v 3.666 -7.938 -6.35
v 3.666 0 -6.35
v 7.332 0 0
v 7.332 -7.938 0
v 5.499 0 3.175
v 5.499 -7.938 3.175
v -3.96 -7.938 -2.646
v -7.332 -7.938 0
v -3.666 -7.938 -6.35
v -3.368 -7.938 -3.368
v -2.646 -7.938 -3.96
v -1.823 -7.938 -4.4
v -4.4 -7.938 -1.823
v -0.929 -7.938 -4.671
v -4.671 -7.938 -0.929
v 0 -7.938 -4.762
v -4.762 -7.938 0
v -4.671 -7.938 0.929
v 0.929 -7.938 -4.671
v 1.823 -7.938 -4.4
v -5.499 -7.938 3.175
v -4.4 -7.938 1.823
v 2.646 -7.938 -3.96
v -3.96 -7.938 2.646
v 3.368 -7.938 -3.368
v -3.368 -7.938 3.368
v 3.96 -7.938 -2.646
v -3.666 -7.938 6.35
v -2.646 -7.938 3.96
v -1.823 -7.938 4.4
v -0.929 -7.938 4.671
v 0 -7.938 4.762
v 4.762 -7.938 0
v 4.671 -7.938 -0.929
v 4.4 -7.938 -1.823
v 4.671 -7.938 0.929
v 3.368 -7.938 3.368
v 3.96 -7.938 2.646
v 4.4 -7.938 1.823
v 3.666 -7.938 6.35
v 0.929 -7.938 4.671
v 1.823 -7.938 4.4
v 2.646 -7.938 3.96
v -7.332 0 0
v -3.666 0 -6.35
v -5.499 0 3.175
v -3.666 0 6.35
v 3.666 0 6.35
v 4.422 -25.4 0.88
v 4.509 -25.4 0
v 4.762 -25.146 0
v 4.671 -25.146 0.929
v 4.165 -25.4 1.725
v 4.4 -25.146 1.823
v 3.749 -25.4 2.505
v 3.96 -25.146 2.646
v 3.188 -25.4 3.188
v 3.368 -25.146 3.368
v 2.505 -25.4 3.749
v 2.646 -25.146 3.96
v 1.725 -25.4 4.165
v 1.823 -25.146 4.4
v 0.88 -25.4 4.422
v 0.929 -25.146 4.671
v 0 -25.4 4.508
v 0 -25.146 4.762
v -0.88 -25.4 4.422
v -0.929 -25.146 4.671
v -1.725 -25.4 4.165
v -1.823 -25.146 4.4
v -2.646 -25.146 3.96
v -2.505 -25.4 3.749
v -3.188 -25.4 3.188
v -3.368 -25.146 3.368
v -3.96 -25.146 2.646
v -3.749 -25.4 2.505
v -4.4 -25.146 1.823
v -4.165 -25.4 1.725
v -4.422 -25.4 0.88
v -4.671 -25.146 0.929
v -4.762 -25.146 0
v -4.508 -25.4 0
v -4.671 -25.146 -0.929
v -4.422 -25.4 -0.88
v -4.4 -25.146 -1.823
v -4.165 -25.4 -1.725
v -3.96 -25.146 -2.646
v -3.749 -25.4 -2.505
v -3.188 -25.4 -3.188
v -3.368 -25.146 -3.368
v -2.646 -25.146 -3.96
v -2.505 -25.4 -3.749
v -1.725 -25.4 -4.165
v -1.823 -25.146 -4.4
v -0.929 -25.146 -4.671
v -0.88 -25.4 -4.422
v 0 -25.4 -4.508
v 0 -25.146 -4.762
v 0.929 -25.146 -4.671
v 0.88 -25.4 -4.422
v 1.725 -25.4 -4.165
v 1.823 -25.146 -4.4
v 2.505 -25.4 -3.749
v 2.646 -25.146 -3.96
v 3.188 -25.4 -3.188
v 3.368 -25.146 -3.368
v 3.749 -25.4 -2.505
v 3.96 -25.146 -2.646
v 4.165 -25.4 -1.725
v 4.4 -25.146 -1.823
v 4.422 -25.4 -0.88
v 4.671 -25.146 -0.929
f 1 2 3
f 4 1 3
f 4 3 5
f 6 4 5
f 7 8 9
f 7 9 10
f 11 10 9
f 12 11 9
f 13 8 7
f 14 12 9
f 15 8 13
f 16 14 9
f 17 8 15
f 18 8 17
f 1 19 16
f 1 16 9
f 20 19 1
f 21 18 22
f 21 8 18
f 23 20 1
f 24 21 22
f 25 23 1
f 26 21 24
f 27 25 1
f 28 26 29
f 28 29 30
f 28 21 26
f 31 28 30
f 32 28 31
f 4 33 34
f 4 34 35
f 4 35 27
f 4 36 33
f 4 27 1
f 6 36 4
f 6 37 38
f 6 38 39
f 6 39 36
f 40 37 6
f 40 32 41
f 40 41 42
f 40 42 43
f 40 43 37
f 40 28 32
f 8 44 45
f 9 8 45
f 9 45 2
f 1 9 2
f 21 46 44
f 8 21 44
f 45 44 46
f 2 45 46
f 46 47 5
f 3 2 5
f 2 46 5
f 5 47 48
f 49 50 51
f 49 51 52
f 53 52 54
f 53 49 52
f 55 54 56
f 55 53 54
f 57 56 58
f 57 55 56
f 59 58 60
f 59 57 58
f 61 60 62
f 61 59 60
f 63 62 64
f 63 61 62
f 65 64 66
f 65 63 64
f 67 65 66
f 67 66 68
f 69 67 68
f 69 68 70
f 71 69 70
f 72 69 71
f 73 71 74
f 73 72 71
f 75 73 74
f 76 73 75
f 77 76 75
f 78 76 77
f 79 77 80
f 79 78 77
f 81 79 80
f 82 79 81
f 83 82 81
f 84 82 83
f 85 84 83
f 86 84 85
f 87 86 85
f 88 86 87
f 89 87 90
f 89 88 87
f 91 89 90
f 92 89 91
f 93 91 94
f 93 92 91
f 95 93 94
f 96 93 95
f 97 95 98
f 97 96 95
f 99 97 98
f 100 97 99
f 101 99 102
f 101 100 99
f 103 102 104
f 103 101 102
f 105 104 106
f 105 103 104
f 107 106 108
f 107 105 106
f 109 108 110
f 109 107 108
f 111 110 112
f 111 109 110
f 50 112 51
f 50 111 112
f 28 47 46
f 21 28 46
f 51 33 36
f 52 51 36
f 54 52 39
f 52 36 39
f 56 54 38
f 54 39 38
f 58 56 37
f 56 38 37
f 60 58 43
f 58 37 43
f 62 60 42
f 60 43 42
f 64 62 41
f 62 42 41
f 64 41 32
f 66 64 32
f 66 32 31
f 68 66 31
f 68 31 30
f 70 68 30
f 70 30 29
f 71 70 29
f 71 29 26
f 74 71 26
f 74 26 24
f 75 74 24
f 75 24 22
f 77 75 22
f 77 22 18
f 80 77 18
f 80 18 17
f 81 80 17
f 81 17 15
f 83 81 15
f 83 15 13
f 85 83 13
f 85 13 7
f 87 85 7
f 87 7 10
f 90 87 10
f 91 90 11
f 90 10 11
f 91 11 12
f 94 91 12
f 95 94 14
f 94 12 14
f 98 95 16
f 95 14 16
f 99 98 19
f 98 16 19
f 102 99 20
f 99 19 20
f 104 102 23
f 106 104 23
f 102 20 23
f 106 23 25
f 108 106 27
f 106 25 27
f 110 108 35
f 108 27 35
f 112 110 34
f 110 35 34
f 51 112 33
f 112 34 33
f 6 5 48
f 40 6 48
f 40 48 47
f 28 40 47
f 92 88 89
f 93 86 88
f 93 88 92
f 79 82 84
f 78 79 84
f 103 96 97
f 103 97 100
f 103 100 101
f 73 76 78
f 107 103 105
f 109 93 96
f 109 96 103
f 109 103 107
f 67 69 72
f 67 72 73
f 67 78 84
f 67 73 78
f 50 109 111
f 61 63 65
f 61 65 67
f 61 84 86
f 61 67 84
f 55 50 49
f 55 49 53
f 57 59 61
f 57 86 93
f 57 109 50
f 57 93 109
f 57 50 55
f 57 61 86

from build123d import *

# Parameters (mm, degrees)
F0_R     = 4.7625
F1_DEPTH = 25.4
F3_DEPTH = 7.9375
F4_SIZE  = 0.254


with BuildPart() as f1:
    # F0 (on Front) → F1 (new body)
    with BuildSketch(Plane.XZ):
        Circle(F0_R)
    extrude(amount=F1_DEPTH)

    # F2 (on Front) → F3 (join)
    with BuildSketch(Plane.XZ):
        with BuildLine():
            ThreePointArc((-5.4992613166, 3.1749999956), (-3.1750000022, 5.4992613128), (0, 6.35))
            Line((0, 6.35), (-3.6661742094, 6.35))
            Line((-3.6661742094, 6.35), (-5.4992613166, 3.1749999956))
        make_face()
        with BuildLine():
            ThreePointArc((-5.499261351, -3.174999936), (-6.35, 3.44e-08), (-5.4992613166, 3.1749999956))
            Line((-5.4992613166, 3.1749999956), (-7.3323484187, 0))
            Line((-7.3323484187, 0), (-5.499261351, -3.174999936))
        make_face()
        with BuildLine():
            Line((-3.6661742094, -6.35), (0, -6.35))
            ThreePointArc((0, -6.35), (-3.175000032, -5.4992612955), (-5.499261351, -3.174999936))
            Line((-5.499261351, -3.174999936), (-3.6661742094, -6.35))
        make_face()
        with BuildLine():
            ThreePointArc((0, 6.35), (3.174999954, 5.4992613406), (5.4992612609, 3.175000092))
            Line((5.4992612609, 3.175000092), (3.6661742094, 6.35))
            Line((3.6661742094, 6.35), (0, 6.35))
        make_face()
        with BuildLine():
            ThreePointArc((5.4992612609, 3.175000092), (6.1336289832, 1.6435009877), (6.35, 0))
            ThreePointArc((6.35, 0), (6.1336290065, -1.6435009007), (5.499261351, -3.174999936))
            Line((5.499261351, -3.174999936), (7.3323484187, 0))
            Line((7.3323484187, 0), (5.4992612609, 3.175000092))
        make_face()
        with BuildLine():
            Line((3.6661742094, -6.35), (5.499261351, -3.174999936))
            ThreePointArc((5.499261351, -3.174999936), (3.175000032, -5.4992612955), (0, -6.35))
            Line((0, -6.35), (3.6661742094, -6.35))
        make_face()
        with BuildLine():
            ThreePointArc((5.499261351, -3.174999936), (6.1336290065, -1.6435009007), (6.35, 0))
            ThreePointArc((6.35, 0), (6.1336289832, 1.6435009877), (5.4992612609, 3.175000092))
            ThreePointArc((5.4992612609, 3.175000092), (3.174999954, 5.4992613406), (0, 6.35))
            ThreePointArc((0, 6.35), (-3.1750000022, 5.4992613128), (-5.4992613166, 3.1749999956))
            ThreePointArc((-5.4992613166, 3.1749999956), (-6.35, 3.44e-08), (-5.499261351, -3.174999936))
            ThreePointArc((-5.499261351, -3.174999936), (-3.175000032, -5.4992612955), (0, -6.35))
            ThreePointArc((0, -6.35), (3.175000032, -5.4992612955), (5.499261351, -3.174999936))
        make_face()
    extrude(amount=F3_DEPTH)

    # F4
    f4_edges = [f1.edges().sort_by_distance(p)[0] for p in [
        (-4.7625, -25.4, 0),
    ]]
    chamfer(f4_edges, length=F4_SIZE)


solid = f1.part
